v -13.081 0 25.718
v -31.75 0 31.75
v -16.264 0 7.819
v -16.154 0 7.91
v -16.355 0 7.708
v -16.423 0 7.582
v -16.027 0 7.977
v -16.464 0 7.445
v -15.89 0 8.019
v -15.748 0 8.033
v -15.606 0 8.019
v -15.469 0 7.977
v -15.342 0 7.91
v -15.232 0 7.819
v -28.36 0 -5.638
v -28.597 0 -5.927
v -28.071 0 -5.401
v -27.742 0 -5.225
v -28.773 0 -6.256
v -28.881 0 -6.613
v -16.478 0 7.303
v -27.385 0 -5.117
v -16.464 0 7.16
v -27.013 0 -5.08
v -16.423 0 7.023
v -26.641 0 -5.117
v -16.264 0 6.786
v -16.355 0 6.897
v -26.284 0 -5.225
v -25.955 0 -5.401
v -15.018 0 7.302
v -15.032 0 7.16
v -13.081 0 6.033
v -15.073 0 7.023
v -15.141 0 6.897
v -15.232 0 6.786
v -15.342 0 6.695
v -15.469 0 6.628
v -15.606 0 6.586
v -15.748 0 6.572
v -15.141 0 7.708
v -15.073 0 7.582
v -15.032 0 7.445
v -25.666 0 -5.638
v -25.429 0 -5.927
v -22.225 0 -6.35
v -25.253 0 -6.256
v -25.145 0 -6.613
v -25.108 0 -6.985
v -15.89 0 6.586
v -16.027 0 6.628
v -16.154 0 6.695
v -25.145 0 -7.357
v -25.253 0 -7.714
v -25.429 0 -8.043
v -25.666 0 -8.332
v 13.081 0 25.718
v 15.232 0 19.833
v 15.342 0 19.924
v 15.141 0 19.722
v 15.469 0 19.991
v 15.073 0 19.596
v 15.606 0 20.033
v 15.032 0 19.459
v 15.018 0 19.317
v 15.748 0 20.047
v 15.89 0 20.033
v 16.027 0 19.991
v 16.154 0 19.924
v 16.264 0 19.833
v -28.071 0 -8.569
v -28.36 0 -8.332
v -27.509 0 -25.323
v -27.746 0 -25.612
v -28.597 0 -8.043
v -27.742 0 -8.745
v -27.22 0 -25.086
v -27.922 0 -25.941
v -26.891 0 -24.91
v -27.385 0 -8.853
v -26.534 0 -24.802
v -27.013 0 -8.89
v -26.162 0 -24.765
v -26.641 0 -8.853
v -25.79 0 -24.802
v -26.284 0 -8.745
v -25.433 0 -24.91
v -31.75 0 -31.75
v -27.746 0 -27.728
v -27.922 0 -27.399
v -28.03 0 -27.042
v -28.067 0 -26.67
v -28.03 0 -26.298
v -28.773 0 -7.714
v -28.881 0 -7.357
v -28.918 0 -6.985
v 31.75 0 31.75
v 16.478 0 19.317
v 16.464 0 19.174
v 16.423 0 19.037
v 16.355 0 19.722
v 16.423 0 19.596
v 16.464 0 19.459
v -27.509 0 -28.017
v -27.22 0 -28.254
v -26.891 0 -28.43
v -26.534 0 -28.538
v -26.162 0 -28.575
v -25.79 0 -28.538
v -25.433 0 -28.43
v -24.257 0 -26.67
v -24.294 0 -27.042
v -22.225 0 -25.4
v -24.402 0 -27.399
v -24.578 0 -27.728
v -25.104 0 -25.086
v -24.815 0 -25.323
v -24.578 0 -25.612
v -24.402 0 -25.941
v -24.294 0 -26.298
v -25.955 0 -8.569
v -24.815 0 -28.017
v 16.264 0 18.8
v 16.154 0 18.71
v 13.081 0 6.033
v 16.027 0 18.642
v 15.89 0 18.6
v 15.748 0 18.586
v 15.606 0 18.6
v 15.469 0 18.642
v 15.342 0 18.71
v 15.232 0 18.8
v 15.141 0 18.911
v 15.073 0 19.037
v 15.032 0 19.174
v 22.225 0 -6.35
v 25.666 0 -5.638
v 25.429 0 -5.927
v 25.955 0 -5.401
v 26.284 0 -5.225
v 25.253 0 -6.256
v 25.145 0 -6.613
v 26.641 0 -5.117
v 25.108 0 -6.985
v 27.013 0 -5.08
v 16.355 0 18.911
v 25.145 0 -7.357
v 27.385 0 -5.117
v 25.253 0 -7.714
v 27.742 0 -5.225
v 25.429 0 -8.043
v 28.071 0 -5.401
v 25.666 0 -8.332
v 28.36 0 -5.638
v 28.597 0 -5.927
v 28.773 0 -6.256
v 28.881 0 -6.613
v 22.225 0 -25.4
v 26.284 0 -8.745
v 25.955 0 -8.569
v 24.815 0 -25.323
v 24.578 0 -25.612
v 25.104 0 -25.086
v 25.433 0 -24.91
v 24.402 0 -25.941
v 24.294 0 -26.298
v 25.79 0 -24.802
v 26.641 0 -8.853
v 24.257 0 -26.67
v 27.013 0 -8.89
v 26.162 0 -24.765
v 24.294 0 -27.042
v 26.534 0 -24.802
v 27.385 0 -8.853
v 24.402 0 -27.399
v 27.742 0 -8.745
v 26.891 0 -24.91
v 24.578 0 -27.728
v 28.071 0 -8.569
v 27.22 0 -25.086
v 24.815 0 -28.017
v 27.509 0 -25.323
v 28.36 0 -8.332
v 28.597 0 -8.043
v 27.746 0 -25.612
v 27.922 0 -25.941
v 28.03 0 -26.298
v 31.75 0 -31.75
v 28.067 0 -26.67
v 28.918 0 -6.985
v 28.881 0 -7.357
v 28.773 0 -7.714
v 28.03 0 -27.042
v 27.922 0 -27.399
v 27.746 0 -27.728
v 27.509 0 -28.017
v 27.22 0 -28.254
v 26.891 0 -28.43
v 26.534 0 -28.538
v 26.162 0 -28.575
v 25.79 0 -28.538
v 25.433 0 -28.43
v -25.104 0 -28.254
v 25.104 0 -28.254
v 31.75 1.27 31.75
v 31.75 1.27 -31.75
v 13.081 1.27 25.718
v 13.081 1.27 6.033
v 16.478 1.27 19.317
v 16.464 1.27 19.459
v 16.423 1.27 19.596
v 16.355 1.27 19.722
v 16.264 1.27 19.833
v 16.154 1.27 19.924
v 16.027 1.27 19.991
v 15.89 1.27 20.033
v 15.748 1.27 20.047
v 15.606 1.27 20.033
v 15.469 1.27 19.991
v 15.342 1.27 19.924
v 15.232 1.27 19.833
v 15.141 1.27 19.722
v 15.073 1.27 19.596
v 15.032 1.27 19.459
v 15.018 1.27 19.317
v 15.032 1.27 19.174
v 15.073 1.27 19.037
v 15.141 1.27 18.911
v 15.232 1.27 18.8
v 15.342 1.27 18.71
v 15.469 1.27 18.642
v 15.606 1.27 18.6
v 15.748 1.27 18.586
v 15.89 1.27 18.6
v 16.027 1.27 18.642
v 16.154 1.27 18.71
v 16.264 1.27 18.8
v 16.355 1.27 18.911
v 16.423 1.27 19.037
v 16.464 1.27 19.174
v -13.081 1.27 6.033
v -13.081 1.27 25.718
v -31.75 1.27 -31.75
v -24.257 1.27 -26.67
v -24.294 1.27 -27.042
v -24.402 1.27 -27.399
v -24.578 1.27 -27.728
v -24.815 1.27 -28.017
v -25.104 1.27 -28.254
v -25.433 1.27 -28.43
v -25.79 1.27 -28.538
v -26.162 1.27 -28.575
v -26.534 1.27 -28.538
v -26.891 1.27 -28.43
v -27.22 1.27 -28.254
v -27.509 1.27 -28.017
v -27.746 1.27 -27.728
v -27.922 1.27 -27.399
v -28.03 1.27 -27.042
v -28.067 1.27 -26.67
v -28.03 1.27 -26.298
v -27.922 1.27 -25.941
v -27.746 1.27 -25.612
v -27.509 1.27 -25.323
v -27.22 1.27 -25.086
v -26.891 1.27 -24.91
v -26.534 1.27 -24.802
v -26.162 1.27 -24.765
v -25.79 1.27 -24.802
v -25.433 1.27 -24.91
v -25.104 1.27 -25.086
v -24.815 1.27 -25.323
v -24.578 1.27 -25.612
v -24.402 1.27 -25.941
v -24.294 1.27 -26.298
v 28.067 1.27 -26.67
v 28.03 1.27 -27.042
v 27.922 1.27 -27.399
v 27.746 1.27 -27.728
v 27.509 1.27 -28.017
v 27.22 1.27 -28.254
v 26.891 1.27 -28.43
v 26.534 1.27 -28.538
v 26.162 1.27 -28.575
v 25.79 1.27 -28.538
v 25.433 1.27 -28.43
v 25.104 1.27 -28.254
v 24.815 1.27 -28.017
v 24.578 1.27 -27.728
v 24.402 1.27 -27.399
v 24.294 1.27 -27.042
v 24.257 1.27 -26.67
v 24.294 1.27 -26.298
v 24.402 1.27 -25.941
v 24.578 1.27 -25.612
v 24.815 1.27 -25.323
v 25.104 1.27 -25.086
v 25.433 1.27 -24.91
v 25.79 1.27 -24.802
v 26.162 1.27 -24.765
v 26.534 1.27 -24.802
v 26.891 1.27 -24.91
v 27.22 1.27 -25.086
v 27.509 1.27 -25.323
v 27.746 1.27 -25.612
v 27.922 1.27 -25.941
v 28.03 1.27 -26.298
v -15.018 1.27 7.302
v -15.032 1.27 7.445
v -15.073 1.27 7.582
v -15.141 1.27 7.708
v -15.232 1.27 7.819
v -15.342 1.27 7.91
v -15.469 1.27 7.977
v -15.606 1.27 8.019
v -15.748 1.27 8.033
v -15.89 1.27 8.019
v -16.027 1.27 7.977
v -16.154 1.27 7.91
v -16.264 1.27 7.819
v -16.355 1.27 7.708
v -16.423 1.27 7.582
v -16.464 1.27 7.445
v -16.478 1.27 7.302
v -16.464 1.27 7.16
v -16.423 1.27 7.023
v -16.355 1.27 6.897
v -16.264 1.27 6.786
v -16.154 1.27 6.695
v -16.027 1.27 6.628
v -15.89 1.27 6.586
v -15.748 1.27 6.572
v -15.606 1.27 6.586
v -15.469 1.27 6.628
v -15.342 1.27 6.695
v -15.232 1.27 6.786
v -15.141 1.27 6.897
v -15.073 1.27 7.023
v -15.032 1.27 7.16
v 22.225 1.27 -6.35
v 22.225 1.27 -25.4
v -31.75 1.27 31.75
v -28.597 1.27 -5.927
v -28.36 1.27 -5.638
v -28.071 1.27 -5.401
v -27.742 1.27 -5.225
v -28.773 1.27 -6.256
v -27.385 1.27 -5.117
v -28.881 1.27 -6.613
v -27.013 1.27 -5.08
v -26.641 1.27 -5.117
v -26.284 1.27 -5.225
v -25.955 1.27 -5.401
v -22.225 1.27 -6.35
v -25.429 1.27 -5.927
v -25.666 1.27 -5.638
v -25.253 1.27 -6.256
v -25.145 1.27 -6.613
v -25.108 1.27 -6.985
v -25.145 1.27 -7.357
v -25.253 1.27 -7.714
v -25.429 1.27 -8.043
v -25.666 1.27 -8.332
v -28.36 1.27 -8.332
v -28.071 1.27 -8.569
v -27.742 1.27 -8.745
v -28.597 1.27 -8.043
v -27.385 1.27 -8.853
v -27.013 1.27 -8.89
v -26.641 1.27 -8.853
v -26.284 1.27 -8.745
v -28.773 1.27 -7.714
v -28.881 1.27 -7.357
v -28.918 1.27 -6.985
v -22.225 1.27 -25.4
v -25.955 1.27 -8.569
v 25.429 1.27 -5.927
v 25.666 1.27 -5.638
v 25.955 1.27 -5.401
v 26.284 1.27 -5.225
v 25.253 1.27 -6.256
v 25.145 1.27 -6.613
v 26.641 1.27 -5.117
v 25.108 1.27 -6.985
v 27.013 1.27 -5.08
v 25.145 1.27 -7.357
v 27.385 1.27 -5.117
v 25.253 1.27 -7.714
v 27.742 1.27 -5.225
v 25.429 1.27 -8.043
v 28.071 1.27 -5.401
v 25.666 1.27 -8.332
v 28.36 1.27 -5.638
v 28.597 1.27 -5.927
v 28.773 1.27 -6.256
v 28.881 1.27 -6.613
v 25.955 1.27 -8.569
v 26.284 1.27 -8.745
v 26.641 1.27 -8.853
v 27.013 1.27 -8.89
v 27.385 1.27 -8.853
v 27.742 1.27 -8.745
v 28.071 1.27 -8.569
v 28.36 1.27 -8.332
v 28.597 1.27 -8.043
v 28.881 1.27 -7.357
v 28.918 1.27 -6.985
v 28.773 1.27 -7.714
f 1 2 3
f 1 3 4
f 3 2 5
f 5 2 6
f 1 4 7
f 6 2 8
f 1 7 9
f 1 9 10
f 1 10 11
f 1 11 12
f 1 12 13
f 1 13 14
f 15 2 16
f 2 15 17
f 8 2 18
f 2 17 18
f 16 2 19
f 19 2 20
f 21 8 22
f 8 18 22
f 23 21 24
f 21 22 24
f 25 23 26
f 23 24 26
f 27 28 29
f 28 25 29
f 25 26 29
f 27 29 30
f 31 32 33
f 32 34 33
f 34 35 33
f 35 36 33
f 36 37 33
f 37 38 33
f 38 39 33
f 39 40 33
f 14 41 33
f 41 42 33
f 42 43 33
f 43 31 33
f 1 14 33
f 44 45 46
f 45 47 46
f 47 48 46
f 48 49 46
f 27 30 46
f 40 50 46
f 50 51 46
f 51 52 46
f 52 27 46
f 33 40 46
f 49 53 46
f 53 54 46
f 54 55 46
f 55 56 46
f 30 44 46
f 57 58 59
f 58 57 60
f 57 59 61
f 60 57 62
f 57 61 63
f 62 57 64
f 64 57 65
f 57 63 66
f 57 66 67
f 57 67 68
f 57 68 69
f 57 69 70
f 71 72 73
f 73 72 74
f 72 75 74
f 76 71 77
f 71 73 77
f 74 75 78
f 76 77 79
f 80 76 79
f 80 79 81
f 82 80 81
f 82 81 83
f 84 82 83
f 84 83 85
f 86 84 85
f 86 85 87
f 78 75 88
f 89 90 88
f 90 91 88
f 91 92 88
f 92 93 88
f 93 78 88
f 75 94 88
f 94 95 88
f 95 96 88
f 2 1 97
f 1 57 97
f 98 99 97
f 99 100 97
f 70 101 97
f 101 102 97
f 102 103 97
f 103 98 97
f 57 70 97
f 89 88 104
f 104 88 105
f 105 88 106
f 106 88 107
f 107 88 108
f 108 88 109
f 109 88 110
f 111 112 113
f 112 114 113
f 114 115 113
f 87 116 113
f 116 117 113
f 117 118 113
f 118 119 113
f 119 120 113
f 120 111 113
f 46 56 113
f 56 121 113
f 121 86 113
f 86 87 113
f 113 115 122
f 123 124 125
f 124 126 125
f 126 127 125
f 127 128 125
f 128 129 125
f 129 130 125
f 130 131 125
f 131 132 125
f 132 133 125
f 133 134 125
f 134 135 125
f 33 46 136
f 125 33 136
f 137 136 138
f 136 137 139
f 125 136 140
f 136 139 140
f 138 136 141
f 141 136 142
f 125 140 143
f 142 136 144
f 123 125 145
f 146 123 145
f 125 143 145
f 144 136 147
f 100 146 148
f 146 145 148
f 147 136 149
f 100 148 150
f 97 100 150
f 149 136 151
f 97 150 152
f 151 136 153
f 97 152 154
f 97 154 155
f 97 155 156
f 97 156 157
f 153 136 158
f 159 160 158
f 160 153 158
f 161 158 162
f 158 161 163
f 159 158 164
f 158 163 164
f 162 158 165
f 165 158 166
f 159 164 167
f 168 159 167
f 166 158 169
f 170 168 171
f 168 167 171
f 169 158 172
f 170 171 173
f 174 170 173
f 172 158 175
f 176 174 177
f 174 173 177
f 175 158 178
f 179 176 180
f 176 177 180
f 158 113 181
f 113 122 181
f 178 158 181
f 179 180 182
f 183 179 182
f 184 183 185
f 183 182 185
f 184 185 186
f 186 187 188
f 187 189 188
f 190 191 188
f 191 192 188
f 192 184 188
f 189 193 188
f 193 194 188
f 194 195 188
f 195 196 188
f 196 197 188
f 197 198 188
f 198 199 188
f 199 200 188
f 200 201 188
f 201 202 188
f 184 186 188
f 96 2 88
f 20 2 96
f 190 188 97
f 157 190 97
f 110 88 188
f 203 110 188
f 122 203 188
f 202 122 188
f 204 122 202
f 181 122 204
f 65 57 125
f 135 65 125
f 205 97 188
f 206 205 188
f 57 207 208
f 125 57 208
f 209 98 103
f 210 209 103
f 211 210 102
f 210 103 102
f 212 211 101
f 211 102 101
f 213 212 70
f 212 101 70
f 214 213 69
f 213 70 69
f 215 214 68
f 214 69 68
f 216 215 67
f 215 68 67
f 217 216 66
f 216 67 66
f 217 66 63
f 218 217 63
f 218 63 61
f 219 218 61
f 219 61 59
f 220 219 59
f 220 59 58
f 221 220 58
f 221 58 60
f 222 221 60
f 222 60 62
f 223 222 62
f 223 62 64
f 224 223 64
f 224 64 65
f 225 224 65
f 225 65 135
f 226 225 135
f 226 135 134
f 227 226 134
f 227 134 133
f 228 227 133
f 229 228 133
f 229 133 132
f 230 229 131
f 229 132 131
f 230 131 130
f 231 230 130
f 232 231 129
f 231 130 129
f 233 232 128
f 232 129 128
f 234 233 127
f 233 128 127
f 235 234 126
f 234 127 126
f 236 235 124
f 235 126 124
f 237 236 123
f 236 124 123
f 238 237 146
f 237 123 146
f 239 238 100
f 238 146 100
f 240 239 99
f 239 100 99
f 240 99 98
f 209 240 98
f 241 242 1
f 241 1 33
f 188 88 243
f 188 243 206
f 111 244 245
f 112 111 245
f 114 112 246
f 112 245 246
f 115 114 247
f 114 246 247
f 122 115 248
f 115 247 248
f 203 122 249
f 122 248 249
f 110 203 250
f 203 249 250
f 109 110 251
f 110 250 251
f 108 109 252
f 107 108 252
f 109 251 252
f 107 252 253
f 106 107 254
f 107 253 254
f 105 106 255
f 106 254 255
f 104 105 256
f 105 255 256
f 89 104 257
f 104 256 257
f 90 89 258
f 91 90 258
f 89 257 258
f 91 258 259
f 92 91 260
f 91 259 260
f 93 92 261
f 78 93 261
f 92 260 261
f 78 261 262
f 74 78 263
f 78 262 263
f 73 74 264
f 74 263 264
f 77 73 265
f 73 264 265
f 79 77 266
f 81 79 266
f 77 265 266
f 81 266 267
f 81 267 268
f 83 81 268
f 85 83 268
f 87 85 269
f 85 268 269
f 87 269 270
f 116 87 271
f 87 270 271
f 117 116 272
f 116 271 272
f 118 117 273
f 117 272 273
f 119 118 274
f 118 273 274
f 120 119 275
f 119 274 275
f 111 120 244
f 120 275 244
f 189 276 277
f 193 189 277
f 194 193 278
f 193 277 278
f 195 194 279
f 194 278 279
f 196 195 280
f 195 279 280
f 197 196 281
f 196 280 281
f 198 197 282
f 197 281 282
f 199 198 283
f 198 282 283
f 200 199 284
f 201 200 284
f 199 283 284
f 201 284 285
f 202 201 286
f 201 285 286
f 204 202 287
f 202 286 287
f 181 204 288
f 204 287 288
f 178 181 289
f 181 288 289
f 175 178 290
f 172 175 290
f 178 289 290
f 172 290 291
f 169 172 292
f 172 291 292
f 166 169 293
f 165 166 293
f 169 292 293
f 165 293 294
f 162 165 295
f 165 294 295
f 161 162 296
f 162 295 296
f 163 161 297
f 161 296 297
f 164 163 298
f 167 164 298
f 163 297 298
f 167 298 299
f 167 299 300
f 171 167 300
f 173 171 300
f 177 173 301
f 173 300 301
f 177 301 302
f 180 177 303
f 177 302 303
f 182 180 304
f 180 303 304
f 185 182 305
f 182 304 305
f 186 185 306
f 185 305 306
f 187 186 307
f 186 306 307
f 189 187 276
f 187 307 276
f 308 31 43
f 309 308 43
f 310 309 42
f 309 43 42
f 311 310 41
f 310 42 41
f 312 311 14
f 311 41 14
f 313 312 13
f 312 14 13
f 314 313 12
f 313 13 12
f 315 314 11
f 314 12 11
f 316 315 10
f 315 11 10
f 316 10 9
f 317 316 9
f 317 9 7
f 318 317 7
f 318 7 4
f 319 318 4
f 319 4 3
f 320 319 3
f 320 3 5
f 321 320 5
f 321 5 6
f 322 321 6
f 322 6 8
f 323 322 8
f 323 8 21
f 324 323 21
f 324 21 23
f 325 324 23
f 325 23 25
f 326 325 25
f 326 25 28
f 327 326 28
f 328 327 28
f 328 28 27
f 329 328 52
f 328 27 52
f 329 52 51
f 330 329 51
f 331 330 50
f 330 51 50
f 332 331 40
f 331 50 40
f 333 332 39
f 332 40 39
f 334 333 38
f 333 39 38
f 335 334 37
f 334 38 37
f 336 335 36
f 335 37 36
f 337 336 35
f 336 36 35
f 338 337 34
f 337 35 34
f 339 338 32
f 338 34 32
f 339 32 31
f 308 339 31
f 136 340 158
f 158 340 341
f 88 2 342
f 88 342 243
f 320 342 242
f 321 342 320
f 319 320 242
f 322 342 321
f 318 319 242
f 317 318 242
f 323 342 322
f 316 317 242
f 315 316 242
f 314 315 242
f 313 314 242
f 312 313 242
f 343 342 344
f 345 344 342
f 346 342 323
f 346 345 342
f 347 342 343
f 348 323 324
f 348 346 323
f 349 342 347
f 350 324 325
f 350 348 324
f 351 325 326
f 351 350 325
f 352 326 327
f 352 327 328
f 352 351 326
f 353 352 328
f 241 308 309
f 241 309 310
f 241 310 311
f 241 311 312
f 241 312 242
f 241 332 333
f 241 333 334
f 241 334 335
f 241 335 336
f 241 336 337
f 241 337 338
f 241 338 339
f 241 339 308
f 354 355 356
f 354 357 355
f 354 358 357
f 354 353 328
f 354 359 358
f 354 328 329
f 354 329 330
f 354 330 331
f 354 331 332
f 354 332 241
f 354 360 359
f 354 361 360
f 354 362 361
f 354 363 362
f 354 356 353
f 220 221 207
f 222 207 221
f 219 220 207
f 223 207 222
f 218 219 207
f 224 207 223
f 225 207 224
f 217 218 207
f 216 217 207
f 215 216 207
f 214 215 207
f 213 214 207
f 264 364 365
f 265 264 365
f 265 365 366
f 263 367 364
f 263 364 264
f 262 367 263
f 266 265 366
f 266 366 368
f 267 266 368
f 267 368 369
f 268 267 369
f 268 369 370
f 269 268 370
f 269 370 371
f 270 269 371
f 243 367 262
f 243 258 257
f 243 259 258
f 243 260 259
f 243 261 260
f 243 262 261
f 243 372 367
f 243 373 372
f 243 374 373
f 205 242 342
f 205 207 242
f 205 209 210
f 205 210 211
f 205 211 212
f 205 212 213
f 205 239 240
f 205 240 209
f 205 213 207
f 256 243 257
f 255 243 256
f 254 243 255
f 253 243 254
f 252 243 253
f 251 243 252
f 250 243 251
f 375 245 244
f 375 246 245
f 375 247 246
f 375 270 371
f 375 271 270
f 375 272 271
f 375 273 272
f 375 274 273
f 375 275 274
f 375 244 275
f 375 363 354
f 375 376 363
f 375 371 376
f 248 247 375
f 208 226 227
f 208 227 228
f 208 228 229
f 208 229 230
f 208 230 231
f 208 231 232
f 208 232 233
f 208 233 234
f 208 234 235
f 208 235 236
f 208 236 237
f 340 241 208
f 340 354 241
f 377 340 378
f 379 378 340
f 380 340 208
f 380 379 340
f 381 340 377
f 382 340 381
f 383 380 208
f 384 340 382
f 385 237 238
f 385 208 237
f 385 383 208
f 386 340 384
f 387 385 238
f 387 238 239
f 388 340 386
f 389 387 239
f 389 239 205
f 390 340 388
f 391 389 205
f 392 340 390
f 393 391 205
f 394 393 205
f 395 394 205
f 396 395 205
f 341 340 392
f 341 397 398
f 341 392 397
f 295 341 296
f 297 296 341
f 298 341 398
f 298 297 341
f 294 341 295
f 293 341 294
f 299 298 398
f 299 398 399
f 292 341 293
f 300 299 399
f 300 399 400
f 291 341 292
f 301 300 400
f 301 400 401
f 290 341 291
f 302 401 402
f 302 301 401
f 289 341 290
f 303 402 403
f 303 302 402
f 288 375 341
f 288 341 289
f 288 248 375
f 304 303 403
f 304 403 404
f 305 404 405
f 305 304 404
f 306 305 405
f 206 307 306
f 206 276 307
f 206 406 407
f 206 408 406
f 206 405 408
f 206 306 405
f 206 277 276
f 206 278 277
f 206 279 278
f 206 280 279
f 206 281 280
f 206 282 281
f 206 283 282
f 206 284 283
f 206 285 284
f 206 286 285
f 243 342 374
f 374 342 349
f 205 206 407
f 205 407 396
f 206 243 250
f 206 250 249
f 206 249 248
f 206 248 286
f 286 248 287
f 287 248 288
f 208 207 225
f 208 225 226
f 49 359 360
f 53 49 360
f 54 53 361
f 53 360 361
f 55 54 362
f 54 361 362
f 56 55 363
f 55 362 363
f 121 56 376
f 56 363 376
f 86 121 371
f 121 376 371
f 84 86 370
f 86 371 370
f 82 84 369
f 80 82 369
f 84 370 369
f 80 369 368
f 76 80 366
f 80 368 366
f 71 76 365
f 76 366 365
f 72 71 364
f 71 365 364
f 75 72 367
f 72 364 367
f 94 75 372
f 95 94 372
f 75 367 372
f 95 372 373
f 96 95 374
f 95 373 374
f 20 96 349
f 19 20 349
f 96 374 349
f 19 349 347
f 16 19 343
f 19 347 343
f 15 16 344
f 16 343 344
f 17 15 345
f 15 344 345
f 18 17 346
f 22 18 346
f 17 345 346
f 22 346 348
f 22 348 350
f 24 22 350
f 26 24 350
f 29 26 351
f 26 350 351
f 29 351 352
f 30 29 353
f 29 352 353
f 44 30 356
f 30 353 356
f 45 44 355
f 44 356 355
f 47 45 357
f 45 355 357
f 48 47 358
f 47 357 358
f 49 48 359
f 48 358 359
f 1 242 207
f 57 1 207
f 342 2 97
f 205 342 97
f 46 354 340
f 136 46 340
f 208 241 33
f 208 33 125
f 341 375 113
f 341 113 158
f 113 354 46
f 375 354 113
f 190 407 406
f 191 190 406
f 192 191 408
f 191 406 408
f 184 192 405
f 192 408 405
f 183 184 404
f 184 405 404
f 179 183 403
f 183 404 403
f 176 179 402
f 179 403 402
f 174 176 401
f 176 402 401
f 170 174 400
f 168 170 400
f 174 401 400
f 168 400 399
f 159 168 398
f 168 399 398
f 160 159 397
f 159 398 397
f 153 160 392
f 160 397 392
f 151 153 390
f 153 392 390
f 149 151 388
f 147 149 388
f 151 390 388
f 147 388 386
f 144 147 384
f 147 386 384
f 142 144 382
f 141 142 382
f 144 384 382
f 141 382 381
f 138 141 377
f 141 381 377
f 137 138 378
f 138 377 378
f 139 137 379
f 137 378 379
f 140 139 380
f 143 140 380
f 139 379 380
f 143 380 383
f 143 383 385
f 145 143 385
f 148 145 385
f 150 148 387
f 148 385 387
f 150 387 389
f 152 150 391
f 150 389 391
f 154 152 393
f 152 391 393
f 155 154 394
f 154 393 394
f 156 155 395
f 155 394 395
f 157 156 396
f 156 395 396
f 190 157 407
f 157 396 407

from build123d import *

# Parameters (mm, degrees)
SKETCH1_W           = 63.5
SKETCH1_H           = 63.5
BOSS_EXTRUDE1_DEPTH = 1.27
SKETCH2_R           = 1.905
CUT_EXTRUDE1_DEPTH  = 1.27
SKETCH3_W           = 44.45
SKETCH3_H           = 19.05
CUT_EXTRUDE2_DEPTH  = 1.27
SKETCH4_R           = 0.73025
BOSS_EXTRUDE2_DEPTH = 3.81
CUT_EXTRUDE3_REACH  = 5.81
SKETCH5_W           = 26.162
SKETCH5_H           = 19.685
SKETCH6_R           = 0.73025
CUT_EXTRUDE4_DEPTH  = 4.81


with BuildPart() as part:
    # Sketch1 → Boss-Extrude1 (new body)
    with BuildSketch(Plane(origin=(0, 0, 0), x_dir=(1, 0, 0), z_dir=(0, 1, 0))):
        Rectangle(SKETCH1_W, SKETCH1_H)
    extrude(amount=BOSS_EXTRUDE1_DEPTH)

    # Sketch2 → Cut-Extrude1 (cut)
    with BuildSketch(Plane(origin=(0, 1.27, 0), x_dir=(1, 0, 0), z_dir=(0, 1, 0))):
        with Locations((27.0129, 6.985)):
            Circle(SKETCH2_R)
        with Locations((26.162, 26.67)):
            Circle(SKETCH2_R)
        with Locations((-27.0129, 6.985)):
            Circle(SKETCH2_R)
        with Locations((-26.162, 26.67)):
            Circle(SKETCH2_R)
    extrude(amount=-CUT_EXTRUDE1_DEPTH, mode=Mode.SUBTRACT)

    # Sketch3 → Cut-Extrude2 (cut)
    with BuildSketch(Plane(origin=(0, 1.27, 0), x_dir=(1, 0, 0), z_dir=(0, 1, 0))):
        with Locations((0, 15.875)):
            Rectangle(SKETCH3_W, SKETCH3_H)
    extrude(amount=-CUT_EXTRUDE2_DEPTH, mode=Mode.SUBTRACT)

    # Sketch4 → Boss-Extrude2 (add)
    with BuildSketch(Plane(origin=(0, 1.27, 0), x_dir=(1, 0, 0), z_dir=(0, 1, 0))):
        with Locations((-15.748, -7.3025)):
            Circle(SKETCH4_R)
        with Locations((15.748, -19.3167)):
            Circle(SKETCH4_R)
    extrude(amount=-BOSS_EXTRUDE2_DEPTH)

    # Sketch5 → Cut-Extrude3 (cut, up to next)
    with BuildSketch(Plane(origin=(0, 1.27, 0), x_dir=(1, 0, 0), z_dir=(0, 1, 0)), mode=Mode.PRIVATE) as cut_extrude3_sk1:
        with Locations((0, -15.875)):
            Rectangle(SKETCH5_W, SKETCH5_H)
    cut_extrude3_tool1 = extrude(cut_extrude3_sk1.sketch, amount=-CUT_EXTRUDE3_REACH, mode=Mode.PRIVATE) & part.part
    add(cut_extrude3_tool1.solids().sort_by_distance((0, 1.27, 15.875))[0], mode=Mode.SUBTRACT)

    # Sketch6 → Cut-Extrude4 (cut, through all)
    with BuildSketch(Plane.XZ.offset(2.54)):
        with Locations((15.748, 19.3167)):
            Circle(SKETCH6_R)
        with Locations((-15.748, 7.3025)):
            Circle(SKETCH6_R)
    extrude(amount=-CUT_EXTRUDE4_DEPTH, mode=Mode.SUBTRACT)


solid = part.part
